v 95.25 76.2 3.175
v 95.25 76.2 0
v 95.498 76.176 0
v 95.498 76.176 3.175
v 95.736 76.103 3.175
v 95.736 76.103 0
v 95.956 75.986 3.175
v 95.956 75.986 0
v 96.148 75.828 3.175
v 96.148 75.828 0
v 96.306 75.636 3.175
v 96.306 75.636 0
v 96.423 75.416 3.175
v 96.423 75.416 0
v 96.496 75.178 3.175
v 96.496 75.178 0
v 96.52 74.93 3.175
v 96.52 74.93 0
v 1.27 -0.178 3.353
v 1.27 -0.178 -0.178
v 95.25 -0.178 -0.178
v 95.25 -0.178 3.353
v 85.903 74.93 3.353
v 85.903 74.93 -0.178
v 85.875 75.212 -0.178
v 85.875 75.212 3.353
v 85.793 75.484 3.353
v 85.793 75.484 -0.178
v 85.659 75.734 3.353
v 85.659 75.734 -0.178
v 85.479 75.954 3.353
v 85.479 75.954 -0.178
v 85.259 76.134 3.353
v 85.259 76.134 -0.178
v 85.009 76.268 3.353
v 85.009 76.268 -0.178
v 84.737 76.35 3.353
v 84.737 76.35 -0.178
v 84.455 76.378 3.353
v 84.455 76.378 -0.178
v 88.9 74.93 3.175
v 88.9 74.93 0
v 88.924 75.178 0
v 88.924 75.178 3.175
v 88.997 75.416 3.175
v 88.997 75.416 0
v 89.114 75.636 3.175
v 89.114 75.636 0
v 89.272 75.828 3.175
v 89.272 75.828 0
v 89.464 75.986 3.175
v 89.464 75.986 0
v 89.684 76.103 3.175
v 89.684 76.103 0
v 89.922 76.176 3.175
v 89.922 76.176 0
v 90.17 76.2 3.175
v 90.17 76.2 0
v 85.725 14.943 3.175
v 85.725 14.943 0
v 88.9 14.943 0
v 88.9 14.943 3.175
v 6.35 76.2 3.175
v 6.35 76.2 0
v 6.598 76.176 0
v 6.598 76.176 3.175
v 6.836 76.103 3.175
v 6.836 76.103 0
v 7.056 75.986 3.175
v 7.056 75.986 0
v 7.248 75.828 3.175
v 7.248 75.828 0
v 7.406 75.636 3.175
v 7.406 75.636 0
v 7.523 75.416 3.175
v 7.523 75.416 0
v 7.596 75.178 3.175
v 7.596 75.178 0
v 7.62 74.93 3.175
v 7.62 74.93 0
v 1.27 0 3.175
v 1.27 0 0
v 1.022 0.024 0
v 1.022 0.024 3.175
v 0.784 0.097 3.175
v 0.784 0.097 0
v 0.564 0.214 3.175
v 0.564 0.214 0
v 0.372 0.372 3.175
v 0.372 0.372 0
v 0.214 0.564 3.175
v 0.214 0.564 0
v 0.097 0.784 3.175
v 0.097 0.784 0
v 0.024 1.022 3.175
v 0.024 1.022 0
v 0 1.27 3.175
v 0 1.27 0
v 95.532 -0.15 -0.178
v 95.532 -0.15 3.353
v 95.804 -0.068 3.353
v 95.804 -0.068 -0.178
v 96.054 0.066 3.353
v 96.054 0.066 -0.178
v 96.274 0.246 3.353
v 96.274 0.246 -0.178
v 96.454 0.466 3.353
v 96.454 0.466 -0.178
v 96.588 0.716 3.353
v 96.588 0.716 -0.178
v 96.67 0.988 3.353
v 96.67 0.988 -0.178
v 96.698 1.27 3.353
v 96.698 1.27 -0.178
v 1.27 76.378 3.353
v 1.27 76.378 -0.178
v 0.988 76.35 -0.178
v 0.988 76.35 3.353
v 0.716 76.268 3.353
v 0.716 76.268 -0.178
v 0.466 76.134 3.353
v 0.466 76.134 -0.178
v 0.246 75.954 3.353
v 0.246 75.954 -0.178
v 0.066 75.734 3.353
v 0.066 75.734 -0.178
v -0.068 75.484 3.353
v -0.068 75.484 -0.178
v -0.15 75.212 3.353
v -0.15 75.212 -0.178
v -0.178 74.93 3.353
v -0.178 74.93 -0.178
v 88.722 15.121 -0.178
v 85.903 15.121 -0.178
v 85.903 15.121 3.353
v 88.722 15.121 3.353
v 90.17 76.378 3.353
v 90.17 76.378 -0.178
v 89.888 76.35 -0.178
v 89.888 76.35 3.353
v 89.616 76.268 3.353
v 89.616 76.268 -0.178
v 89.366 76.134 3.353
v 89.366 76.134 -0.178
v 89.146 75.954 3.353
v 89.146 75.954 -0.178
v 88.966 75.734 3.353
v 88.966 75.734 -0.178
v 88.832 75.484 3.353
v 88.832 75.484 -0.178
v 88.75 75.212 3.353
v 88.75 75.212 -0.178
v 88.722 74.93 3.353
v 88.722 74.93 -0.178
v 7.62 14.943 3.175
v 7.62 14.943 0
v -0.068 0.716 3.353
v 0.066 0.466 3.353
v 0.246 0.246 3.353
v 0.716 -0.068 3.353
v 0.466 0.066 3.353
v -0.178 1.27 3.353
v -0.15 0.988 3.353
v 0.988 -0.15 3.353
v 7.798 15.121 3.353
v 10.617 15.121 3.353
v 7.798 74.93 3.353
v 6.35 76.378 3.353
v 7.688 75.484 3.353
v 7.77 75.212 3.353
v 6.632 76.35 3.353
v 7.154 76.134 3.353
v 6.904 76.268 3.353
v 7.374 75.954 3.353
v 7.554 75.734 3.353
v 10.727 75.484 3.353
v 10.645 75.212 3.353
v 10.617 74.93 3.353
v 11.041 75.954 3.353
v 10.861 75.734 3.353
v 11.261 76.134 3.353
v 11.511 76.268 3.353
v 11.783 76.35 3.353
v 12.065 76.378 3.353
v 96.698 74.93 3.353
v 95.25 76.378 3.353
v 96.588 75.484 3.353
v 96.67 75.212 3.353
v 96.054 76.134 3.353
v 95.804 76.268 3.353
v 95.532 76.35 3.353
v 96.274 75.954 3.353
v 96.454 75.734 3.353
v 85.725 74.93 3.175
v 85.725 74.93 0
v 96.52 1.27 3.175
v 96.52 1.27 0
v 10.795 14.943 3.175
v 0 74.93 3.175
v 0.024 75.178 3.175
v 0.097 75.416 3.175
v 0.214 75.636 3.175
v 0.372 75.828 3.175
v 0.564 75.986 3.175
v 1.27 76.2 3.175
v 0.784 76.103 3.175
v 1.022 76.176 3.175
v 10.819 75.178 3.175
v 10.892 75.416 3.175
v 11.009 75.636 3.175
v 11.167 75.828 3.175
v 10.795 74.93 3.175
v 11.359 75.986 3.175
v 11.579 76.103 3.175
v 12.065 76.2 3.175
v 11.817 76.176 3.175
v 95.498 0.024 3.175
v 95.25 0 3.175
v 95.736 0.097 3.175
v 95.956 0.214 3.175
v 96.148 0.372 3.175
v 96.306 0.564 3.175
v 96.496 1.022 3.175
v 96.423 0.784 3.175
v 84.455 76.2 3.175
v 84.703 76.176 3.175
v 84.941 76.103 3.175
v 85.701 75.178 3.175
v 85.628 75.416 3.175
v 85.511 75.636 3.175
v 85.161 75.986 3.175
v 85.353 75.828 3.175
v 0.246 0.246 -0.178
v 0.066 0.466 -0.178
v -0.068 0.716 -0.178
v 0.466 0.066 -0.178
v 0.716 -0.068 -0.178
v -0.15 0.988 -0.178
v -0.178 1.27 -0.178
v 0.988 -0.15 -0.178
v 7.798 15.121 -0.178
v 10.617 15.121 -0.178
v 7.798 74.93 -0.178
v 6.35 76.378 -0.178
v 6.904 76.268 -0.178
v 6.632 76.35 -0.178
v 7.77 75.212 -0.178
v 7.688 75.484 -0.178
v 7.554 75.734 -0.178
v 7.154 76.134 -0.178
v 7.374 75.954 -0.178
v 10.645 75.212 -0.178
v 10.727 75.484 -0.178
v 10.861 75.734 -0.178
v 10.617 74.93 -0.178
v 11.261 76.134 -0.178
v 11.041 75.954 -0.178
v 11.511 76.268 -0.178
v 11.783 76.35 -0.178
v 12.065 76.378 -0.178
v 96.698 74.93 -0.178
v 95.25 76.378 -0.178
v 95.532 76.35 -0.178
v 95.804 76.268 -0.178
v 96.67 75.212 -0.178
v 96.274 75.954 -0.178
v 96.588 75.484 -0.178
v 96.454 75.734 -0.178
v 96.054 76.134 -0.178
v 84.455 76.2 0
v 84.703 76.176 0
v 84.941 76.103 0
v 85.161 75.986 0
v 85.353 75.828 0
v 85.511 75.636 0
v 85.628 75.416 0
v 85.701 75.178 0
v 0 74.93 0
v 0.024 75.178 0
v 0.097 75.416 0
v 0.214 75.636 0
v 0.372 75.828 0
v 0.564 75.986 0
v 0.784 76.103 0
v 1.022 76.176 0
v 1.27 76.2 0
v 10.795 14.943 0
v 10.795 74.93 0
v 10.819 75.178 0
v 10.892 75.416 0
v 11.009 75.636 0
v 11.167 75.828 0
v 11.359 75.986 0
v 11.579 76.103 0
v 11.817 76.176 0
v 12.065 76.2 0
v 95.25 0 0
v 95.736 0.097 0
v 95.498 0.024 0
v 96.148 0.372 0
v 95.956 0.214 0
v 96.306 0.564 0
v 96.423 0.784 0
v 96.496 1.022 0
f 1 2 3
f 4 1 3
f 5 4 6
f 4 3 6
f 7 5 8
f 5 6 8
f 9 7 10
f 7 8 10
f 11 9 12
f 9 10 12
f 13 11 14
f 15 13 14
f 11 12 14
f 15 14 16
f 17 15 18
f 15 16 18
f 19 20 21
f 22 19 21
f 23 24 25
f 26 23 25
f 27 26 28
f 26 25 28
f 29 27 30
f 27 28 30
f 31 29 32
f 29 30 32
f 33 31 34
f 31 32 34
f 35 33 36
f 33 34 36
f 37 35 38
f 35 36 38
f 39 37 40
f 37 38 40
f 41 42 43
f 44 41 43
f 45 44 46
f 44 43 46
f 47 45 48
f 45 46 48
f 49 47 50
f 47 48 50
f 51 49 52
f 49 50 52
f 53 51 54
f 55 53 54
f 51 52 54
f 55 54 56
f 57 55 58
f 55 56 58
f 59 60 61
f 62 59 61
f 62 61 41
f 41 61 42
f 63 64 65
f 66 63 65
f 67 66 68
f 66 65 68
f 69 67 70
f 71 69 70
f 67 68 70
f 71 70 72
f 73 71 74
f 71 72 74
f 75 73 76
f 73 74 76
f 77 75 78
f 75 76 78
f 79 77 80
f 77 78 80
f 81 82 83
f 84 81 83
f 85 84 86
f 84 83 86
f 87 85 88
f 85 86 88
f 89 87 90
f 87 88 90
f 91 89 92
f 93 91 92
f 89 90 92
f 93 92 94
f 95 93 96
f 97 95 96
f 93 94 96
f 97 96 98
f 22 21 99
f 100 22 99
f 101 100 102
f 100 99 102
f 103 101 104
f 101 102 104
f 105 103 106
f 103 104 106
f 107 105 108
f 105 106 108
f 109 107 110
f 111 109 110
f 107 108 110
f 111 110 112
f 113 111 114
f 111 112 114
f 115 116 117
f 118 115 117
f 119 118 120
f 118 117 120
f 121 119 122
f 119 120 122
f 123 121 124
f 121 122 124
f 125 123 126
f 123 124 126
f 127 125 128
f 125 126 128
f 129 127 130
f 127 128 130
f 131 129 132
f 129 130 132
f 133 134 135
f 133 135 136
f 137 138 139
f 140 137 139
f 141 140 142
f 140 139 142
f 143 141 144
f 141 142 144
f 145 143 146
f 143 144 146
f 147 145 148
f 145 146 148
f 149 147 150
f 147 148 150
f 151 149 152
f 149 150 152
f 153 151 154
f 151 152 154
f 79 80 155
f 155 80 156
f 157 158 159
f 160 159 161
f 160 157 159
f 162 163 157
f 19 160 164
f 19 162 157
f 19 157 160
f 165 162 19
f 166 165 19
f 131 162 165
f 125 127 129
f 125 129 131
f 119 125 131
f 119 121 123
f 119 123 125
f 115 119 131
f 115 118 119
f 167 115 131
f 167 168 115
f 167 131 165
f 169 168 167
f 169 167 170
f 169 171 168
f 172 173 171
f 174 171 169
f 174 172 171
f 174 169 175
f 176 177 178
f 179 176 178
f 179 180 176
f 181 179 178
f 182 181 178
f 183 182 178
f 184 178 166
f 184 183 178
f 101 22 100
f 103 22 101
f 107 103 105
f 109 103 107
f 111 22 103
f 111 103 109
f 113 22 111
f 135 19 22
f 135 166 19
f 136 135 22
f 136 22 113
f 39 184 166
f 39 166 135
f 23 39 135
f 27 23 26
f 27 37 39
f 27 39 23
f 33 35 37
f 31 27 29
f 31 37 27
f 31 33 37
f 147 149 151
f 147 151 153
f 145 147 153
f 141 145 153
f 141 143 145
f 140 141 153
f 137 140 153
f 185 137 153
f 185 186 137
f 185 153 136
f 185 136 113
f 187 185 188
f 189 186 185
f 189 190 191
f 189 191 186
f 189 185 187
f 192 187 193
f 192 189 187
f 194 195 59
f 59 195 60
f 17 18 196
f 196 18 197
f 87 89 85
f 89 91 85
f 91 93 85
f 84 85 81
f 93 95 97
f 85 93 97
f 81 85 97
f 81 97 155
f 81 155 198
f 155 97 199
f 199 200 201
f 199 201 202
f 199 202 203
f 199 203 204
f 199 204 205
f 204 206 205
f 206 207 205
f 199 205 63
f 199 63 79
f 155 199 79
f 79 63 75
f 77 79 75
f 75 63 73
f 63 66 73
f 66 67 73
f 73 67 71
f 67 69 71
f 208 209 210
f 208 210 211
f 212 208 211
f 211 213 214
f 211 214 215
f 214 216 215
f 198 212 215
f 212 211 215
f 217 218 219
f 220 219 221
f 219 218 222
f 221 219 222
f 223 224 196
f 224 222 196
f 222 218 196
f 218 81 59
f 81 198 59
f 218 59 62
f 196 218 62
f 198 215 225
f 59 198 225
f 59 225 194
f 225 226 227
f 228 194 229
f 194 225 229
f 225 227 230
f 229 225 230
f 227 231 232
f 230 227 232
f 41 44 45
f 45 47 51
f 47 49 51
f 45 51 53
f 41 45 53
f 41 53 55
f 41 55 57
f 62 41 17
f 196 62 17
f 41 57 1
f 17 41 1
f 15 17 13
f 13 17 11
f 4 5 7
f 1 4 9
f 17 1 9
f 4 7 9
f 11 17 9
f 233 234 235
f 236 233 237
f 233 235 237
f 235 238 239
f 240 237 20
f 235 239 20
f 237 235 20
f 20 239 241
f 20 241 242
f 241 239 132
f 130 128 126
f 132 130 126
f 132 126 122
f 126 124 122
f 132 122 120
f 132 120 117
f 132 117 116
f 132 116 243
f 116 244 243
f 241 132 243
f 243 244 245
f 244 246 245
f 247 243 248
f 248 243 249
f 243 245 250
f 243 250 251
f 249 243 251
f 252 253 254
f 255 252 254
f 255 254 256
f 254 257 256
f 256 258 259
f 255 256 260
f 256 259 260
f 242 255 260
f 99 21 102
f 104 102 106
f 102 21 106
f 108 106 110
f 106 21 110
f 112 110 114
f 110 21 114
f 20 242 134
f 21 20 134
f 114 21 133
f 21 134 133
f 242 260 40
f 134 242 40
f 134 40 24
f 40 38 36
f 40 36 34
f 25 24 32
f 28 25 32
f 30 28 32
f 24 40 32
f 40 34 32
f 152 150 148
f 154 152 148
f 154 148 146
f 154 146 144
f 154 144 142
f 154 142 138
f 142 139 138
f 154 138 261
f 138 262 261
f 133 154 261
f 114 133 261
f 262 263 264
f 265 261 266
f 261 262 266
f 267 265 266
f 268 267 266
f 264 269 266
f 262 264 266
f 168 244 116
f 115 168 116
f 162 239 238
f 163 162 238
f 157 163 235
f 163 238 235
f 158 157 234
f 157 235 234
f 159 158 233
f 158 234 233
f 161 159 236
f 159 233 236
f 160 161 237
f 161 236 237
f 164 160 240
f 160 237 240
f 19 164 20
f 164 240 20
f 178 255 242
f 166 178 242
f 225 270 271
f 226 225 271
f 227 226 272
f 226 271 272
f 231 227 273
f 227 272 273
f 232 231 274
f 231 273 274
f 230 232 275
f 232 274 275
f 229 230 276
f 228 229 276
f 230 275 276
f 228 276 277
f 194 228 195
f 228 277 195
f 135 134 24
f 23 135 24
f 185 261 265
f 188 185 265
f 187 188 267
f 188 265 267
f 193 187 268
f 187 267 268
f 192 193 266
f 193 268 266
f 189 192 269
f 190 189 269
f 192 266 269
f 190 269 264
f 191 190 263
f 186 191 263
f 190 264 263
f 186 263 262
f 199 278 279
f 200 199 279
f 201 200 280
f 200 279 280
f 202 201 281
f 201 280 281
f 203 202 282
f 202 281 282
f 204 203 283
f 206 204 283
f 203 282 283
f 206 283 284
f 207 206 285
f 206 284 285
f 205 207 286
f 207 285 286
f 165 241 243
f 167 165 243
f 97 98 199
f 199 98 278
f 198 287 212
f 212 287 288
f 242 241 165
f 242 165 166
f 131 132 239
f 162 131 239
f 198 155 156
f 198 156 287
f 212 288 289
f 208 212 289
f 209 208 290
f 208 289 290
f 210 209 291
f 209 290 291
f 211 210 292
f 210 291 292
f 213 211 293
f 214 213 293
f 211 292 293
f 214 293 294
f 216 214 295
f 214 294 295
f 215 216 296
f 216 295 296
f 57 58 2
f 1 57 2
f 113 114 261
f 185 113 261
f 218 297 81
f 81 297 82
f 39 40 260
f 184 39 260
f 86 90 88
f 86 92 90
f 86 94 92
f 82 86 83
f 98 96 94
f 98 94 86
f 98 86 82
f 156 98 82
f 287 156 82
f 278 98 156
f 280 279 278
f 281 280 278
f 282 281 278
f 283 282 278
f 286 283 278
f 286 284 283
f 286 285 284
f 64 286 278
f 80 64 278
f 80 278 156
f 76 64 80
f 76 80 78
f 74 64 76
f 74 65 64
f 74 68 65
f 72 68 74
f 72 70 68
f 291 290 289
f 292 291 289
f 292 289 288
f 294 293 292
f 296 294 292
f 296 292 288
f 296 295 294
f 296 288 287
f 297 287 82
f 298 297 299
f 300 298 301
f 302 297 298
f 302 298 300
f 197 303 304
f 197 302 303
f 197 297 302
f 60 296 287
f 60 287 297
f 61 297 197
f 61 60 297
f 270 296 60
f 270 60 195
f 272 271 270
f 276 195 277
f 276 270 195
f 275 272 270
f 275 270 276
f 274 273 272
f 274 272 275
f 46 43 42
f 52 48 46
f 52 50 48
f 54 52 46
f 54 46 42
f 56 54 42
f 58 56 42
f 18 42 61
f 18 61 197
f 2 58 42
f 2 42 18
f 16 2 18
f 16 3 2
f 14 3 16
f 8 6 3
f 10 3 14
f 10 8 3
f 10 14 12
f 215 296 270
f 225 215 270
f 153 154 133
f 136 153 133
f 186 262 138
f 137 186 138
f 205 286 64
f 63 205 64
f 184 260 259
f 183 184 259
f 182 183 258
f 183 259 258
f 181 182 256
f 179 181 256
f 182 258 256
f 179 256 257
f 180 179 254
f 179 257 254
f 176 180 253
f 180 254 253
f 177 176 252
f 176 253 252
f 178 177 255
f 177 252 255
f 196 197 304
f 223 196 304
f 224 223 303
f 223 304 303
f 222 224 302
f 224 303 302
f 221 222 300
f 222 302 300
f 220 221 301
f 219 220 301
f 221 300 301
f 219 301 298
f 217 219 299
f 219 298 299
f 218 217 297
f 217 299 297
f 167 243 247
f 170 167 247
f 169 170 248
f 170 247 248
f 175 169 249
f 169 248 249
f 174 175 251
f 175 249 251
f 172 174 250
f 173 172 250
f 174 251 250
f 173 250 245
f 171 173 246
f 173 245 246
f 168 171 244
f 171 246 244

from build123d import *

# Parameters (mm, degrees)
BOSS_EXTRUDE1_DEPTH = 3.175
FILLET1_R           = 1.27
SHELL1_START        = -0.1778
SHELL1_OUTLINE_W    = 80.9244
SHELL1_OUTLINE_H    = 3.5306
SHELL1_DEPTH        = 0.1778
SHELL1_START_2      = 14.942805851
SHELL1_2_OUTLINE_W  = 2.8194
SHELL1_2_OUTLINE_H  = 3.5306
SHELL1_2_DEPTH      = 0.1778
SHELL1_3_DEPTH      = 3.175
SHELL1_4_DEPTH      = 0.1778
SHELL1_START_3      = 3.175
SHELL1_5_DEPTH      = 0.1778
SHELL1_6_DEPTH      = 3.5306


with BuildPart() as part:
    # Sketch1 → Boss-Extrude1 (new body)
    with BuildSketch(Plane.XY):
        Polygon((48.26, 0), (48.26, 76.2), (10.795, 76.2), (10.795, 14.942805851), (7.62, 14.942805851), (7.62, 76.2), (0, 76.2), (0, 0), align=None)
        Polygon((85.725, 76.2), (48.26, 76.2), (48.26, 0), (96.52, 0), (96.52, 76.2), (88.9, 76.2), (88.9, 14.942805851), (85.725, 14.942805851), align=None)
    extrude(amount=BOSS_EXTRUDE1_DEPTH)

    # Fillet1
    fillet1_edges = [part.edges().sort_by_distance(p)[0] for p in [
        (0, 0, 1.5875),
        (0, 76.2, 1.5875),
        (7.62, 76.2, 1.5875),
        (10.795, 76.2, 1.5875),
        (85.725, 76.2, 1.5875),
        (88.9, 76.2, 1.5875),
        (96.52, 76.2, 1.5875),
        (96.52, 0, 1.5875),
    ]]
    fillet(fillet1_edges, radius=FILLET1_R)

    # Shell1: read off the stored shape, not the designer's step
    # Shell1 outline → Shell1 (add)
    with BuildSketch(Plane(origin=(0, 0, 0), x_dir=(1, 0, 0), z_dir=(0, 1, 0)).offset(SHELL1_START)):
        with Locations((48.26, -1.5875)):
            Rectangle(SHELL1_OUTLINE_W, SHELL1_OUTLINE_H)
    extrude(amount=SHELL1_DEPTH)

    # Shell1 2 outline → Shell1 2 (add)
    with BuildSketch(Plane(origin=(0, 0, 0), x_dir=(1, 0, 0), z_dir=(0, 1, 0)).offset(SHELL1_START_2)):
        with Locations((87.3125, -1.5875)):
            Rectangle(SHELL1_2_OUTLINE_W, SHELL1_2_OUTLINE_H)
        with Locations((9.2075, -1.5875)):
            Rectangle(SHELL1_2_OUTLINE_W, SHELL1_2_OUTLINE_H)
    extrude(amount=SHELL1_2_DEPTH)

    # Shell1 3 outline → Shell1 3 (cut)
    with BuildSketch(Plane.XY):
        with BuildLine():
            Line((1.27, 0), (95.25, 0))
            ThreePointArc((95.25, 0), (96.148025612, 0.371974388), (96.52, 1.27))
            Line((96.52, 1.27), (96.52, 74.93))
            ThreePointArc((96.52, 74.93), (96.148025612, 75.828025612), (95.25, 76.2))
            Line((95.25, 76.2), (90.17, 76.2))
            ThreePointArc((90.17, 76.2), (89.271974388, 75.828025612), (88.9, 74.93))
            Line((88.9, 74.93), (88.9, 14.942805851))
            Line((88.9, 14.942805851), (85.725, 14.942805851))
            Line((85.725, 14.942805851), (85.725, 74.93))
            ThreePointArc((85.725, 74.93), (85.353025612, 75.828025612), (84.455, 76.2))
            Line((84.455, 76.2), (12.065, 76.2))
            ThreePointArc((12.065, 76.2), (11.166974388, 75.828025612), (10.795, 74.93))
            Line((10.795, 74.93), (10.795, 14.942805851))
            Line((10.795, 14.942805851), (7.62, 14.942805851))
            Line((7.62, 14.942805851), (7.62, 74.93))
            ThreePointArc((7.62, 74.93), (7.248025612, 75.828025612), (6.35, 76.2))
            Line((6.35, 76.2), (1.27, 76.2))
            ThreePointArc((1.27, 76.2), (0.371974388, 75.828025612), (0, 74.93))
            Line((0, 74.93), (0, 1.27))
            ThreePointArc((0, 1.27), (0.371974388, 0.371974388), (1.27, 0))
        make_face()
    extrude(amount=SHELL1_3_DEPTH, mode=Mode.SUBTRACT)

    # Shell1 4 outline → Shell1 4 (add)
    with BuildSketch(Plane.XY.offset(SHELL1_START)):
        with BuildLine():
            Line((96.6978, 1.27), (96.6978, 74.93))
            ThreePointArc((96.6978, 74.93), (96.273749198, 75.953749198), (95.25, 76.3778))
            Line((95.25, 76.3778), (90.17, 76.3778))
            ThreePointArc((90.17, 76.3778), (89.146250802, 75.953749198), (88.7222, 74.93))
            Line((88.7222, 74.93), (88.7222, 14.942805851))
            Line((88.7222, 14.942805851), (85.9028, 14.942805851))
            Line((85.9028, 14.942805851), (85.9028, 74.93))
            ThreePointArc((85.9028, 74.93), (85.478749198, 75.953749198), (84.455, 76.3778))
            Line((84.455, 76.3778), (12.065, 76.3778))
            ThreePointArc((12.065, 76.3778), (11.041250802, 75.953749198), (10.6172, 74.93))
            Line((10.6172, 74.93), (10.6172, 14.942805851))
            Line((10.6172, 14.942805851), (7.7978, 14.942805851))
            Line((7.7978, 14.942805851), (7.7978, 74.93))
            ThreePointArc((7.7978, 74.93), (7.373749198, 75.953749198), (6.35, 76.3778))
            Line((6.35, 76.3778), (1.27, 76.3778))
            ThreePointArc((1.27, 76.3778), (0.246250802, 75.953749198), (-0.1778, 74.93))
            Line((-0.1778, 74.93), (-0.1778, 1.27))
            ThreePointArc((-0.1778, 1.27), (0.246250802, 0.246250802), (1.27, -0.1778))
            Line((1.27, -0.1778), (7.7978, -0.1778))
            Line((7.7978, -0.1778), (7.7978, 0))
            Line((7.7978, 0), (88.7222, 0))
            Line((88.7222, 0), (88.7222, -0.1778))
            Line((88.7222, -0.1778), (95.25, -0.1778))
            ThreePointArc((95.25, -0.1778), (96.273749198, 0.246250802), (96.6978, 1.27))
        make_face()
    extrude(amount=SHELL1_4_DEPTH)

    # Shell1 5 outline → Shell1 5 (add)
    with BuildSketch(Plane.XY.offset(SHELL1_START_3)):
        with BuildLine():
            Line((96.6978, 1.27), (96.6978, 74.93))
            ThreePointArc((96.6978, 74.93), (96.273749198, 75.953749198), (95.25, 76.3778))
            Line((95.25, 76.3778), (90.17, 76.3778))
            ThreePointArc((90.17, 76.3778), (89.146250802, 75.953749198), (88.7222, 74.93))
            Line((88.7222, 74.93), (88.7222, 14.942805851))
            Line((88.7222, 14.942805851), (85.9028, 14.942805851))
            Line((85.9028, 14.942805851), (85.9028, 74.93))
            ThreePointArc((85.9028, 74.93), (85.478749198, 75.953749198), (84.455, 76.3778))
            Line((84.455, 76.3778), (12.065, 76.3778))
            ThreePointArc((12.065, 76.3778), (11.041250802, 75.953749198), (10.6172, 74.93))
            Line((10.6172, 74.93), (10.6172, 14.942805851))
            Line((10.6172, 14.942805851), (7.7978, 14.942805851))
            Line((7.7978, 14.942805851), (7.7978, 74.93))
            ThreePointArc((7.7978, 74.93), (7.373749198, 75.953749198), (6.35, 76.3778))
            Line((6.35, 76.3778), (1.27, 76.3778))
            ThreePointArc((1.27, 76.3778), (0.246250802, 75.953749198), (-0.1778, 74.93))
            Line((-0.1778, 74.93), (-0.1778, 1.27))
            ThreePointArc((-0.1778, 1.27), (0.246250802, 0.246250802), (1.27, -0.1778))
            Line((1.27, -0.1778), (7.7978, -0.1778))
            Line((7.7978, -0.1778), (7.7978, 0))
            Line((7.7978, 0), (88.7222, 0))
            Line((88.7222, 0), (88.7222, -0.1778))
            Line((88.7222, -0.1778), (95.25, -0.1778))
            ThreePointArc((95.25, -0.1778), (96.273749198, 0.246250802), (96.6978, 1.27))
        make_face()
    extrude(amount=SHELL1_5_DEPTH)

    # Shell1 6 outline → Shell1 6 (add)
    with BuildSketch(Plane.XY.offset(SHELL1_START)):
        with BuildLine():
            Line((96.6978, 1.27), (96.6978, 74.93))
            ThreePointArc((96.6978, 74.93), (96.273749198, 75.953749198), (95.25, 76.3778))
            Line((95.25, 76.3778), (90.17, 76.3778))
            ThreePointArc((90.17, 76.3778), (89.146250802, 75.953749198), (88.7222, 74.93))
            Line((88.7222, 74.93), (88.7222, 14.942805851))
            Line((88.7222, 14.942805851), (88.9, 14.942805851))
            Line((88.9, 14.942805851), (88.9, 74.93))
            ThreePointArc((88.9, 74.93), (89.271974388, 75.828025612), (90.17, 76.2))
            Line((90.17, 76.2), (95.25, 76.2))
            ThreePointArc((95.25, 76.2), (96.148025612, 75.828025612), (96.52, 74.93))
            Line((96.52, 74.93), (96.52, 1.27))
            ThreePointArc((96.52, 1.27), (96.148025612, 0.371974388), (95.25, 0))
            Line((95.25, 0), (88.7222, 0))
            Line((88.7222, 0), (88.7222, -0.1778))
            Line((88.7222, -0.1778), (95.25, -0.1778))
            ThreePointArc((95.25, -0.1778), (96.273749198, 0.246250802), (96.6978, 1.27))
        make_face()
        with BuildLine():
            Line((1.27, -0.1778), (7.7978, -0.1778))
            Line((7.7978, -0.1778), (7.7978, 0))
            Line((7.7978, 0), (1.27, 0))
            ThreePointArc((1.27, 0), (0.371974388, 0.371974388), (0, 1.27))
            Line((0, 1.27), (0, 74.93))
            ThreePointArc((0, 74.93), (0.371974388, 75.828025612), (1.27, 76.2))
            Line((1.27, 76.2), (6.35, 76.2))
            ThreePointArc((6.35, 76.2), (7.248025612, 75.828025612), (7.62, 74.93))
            Line((7.62, 74.93), (7.62, 14.942805851))
            Line((7.62, 14.942805851), (7.7978, 14.942805851))
            Line((7.7978, 14.942805851), (7.7978, 74.93))
            ThreePointArc((7.7978, 74.93), (7.373749198, 75.953749198), (6.35, 76.3778))
            Line((6.35, 76.3778), (1.27, 76.3778))
            ThreePointArc((1.27, 76.3778), (0.246250802, 75.953749198), (-0.1778, 74.93))
            Line((-0.1778, 74.93), (-0.1778, 1.27))
            ThreePointArc((-0.1778, 1.27), (0.246250802, 0.246250802), (1.27, -0.1778))
        make_face()
        with BuildLine():
            Line((85.725, 14.942805851), (85.9028, 14.942805851))
            Line((85.9028, 14.942805851), (85.9028, 74.93))
            ThreePointArc((85.9028, 74.93), (85.478749198, 75.953749198), (84.455, 76.3778))
            Line((84.455, 76.3778), (12.065, 76.3778))
            ThreePointArc((12.065, 76.3778), (11.041250802, 75.953749198), (10.6172, 74.93))
            Line((10.6172, 74.93), (10.6172, 14.942805851))
            Line((10.6172, 14.942805851), (10.795, 14.942805851))
            Line((10.795, 14.942805851), (10.795, 74.93))
            ThreePointArc((10.795, 74.93), (11.166974388, 75.828025612), (12.065, 76.2))
            Line((12.065, 76.2), (84.455, 76.2))
            ThreePointArc((84.455, 76.2), (85.353025612, 75.828025612), (85.725, 74.93))
            Line((85.725, 74.93), (85.725, 14.942805851))
        make_face()
    extrude(amount=SHELL1_6_DEPTH)


solid = part.part
